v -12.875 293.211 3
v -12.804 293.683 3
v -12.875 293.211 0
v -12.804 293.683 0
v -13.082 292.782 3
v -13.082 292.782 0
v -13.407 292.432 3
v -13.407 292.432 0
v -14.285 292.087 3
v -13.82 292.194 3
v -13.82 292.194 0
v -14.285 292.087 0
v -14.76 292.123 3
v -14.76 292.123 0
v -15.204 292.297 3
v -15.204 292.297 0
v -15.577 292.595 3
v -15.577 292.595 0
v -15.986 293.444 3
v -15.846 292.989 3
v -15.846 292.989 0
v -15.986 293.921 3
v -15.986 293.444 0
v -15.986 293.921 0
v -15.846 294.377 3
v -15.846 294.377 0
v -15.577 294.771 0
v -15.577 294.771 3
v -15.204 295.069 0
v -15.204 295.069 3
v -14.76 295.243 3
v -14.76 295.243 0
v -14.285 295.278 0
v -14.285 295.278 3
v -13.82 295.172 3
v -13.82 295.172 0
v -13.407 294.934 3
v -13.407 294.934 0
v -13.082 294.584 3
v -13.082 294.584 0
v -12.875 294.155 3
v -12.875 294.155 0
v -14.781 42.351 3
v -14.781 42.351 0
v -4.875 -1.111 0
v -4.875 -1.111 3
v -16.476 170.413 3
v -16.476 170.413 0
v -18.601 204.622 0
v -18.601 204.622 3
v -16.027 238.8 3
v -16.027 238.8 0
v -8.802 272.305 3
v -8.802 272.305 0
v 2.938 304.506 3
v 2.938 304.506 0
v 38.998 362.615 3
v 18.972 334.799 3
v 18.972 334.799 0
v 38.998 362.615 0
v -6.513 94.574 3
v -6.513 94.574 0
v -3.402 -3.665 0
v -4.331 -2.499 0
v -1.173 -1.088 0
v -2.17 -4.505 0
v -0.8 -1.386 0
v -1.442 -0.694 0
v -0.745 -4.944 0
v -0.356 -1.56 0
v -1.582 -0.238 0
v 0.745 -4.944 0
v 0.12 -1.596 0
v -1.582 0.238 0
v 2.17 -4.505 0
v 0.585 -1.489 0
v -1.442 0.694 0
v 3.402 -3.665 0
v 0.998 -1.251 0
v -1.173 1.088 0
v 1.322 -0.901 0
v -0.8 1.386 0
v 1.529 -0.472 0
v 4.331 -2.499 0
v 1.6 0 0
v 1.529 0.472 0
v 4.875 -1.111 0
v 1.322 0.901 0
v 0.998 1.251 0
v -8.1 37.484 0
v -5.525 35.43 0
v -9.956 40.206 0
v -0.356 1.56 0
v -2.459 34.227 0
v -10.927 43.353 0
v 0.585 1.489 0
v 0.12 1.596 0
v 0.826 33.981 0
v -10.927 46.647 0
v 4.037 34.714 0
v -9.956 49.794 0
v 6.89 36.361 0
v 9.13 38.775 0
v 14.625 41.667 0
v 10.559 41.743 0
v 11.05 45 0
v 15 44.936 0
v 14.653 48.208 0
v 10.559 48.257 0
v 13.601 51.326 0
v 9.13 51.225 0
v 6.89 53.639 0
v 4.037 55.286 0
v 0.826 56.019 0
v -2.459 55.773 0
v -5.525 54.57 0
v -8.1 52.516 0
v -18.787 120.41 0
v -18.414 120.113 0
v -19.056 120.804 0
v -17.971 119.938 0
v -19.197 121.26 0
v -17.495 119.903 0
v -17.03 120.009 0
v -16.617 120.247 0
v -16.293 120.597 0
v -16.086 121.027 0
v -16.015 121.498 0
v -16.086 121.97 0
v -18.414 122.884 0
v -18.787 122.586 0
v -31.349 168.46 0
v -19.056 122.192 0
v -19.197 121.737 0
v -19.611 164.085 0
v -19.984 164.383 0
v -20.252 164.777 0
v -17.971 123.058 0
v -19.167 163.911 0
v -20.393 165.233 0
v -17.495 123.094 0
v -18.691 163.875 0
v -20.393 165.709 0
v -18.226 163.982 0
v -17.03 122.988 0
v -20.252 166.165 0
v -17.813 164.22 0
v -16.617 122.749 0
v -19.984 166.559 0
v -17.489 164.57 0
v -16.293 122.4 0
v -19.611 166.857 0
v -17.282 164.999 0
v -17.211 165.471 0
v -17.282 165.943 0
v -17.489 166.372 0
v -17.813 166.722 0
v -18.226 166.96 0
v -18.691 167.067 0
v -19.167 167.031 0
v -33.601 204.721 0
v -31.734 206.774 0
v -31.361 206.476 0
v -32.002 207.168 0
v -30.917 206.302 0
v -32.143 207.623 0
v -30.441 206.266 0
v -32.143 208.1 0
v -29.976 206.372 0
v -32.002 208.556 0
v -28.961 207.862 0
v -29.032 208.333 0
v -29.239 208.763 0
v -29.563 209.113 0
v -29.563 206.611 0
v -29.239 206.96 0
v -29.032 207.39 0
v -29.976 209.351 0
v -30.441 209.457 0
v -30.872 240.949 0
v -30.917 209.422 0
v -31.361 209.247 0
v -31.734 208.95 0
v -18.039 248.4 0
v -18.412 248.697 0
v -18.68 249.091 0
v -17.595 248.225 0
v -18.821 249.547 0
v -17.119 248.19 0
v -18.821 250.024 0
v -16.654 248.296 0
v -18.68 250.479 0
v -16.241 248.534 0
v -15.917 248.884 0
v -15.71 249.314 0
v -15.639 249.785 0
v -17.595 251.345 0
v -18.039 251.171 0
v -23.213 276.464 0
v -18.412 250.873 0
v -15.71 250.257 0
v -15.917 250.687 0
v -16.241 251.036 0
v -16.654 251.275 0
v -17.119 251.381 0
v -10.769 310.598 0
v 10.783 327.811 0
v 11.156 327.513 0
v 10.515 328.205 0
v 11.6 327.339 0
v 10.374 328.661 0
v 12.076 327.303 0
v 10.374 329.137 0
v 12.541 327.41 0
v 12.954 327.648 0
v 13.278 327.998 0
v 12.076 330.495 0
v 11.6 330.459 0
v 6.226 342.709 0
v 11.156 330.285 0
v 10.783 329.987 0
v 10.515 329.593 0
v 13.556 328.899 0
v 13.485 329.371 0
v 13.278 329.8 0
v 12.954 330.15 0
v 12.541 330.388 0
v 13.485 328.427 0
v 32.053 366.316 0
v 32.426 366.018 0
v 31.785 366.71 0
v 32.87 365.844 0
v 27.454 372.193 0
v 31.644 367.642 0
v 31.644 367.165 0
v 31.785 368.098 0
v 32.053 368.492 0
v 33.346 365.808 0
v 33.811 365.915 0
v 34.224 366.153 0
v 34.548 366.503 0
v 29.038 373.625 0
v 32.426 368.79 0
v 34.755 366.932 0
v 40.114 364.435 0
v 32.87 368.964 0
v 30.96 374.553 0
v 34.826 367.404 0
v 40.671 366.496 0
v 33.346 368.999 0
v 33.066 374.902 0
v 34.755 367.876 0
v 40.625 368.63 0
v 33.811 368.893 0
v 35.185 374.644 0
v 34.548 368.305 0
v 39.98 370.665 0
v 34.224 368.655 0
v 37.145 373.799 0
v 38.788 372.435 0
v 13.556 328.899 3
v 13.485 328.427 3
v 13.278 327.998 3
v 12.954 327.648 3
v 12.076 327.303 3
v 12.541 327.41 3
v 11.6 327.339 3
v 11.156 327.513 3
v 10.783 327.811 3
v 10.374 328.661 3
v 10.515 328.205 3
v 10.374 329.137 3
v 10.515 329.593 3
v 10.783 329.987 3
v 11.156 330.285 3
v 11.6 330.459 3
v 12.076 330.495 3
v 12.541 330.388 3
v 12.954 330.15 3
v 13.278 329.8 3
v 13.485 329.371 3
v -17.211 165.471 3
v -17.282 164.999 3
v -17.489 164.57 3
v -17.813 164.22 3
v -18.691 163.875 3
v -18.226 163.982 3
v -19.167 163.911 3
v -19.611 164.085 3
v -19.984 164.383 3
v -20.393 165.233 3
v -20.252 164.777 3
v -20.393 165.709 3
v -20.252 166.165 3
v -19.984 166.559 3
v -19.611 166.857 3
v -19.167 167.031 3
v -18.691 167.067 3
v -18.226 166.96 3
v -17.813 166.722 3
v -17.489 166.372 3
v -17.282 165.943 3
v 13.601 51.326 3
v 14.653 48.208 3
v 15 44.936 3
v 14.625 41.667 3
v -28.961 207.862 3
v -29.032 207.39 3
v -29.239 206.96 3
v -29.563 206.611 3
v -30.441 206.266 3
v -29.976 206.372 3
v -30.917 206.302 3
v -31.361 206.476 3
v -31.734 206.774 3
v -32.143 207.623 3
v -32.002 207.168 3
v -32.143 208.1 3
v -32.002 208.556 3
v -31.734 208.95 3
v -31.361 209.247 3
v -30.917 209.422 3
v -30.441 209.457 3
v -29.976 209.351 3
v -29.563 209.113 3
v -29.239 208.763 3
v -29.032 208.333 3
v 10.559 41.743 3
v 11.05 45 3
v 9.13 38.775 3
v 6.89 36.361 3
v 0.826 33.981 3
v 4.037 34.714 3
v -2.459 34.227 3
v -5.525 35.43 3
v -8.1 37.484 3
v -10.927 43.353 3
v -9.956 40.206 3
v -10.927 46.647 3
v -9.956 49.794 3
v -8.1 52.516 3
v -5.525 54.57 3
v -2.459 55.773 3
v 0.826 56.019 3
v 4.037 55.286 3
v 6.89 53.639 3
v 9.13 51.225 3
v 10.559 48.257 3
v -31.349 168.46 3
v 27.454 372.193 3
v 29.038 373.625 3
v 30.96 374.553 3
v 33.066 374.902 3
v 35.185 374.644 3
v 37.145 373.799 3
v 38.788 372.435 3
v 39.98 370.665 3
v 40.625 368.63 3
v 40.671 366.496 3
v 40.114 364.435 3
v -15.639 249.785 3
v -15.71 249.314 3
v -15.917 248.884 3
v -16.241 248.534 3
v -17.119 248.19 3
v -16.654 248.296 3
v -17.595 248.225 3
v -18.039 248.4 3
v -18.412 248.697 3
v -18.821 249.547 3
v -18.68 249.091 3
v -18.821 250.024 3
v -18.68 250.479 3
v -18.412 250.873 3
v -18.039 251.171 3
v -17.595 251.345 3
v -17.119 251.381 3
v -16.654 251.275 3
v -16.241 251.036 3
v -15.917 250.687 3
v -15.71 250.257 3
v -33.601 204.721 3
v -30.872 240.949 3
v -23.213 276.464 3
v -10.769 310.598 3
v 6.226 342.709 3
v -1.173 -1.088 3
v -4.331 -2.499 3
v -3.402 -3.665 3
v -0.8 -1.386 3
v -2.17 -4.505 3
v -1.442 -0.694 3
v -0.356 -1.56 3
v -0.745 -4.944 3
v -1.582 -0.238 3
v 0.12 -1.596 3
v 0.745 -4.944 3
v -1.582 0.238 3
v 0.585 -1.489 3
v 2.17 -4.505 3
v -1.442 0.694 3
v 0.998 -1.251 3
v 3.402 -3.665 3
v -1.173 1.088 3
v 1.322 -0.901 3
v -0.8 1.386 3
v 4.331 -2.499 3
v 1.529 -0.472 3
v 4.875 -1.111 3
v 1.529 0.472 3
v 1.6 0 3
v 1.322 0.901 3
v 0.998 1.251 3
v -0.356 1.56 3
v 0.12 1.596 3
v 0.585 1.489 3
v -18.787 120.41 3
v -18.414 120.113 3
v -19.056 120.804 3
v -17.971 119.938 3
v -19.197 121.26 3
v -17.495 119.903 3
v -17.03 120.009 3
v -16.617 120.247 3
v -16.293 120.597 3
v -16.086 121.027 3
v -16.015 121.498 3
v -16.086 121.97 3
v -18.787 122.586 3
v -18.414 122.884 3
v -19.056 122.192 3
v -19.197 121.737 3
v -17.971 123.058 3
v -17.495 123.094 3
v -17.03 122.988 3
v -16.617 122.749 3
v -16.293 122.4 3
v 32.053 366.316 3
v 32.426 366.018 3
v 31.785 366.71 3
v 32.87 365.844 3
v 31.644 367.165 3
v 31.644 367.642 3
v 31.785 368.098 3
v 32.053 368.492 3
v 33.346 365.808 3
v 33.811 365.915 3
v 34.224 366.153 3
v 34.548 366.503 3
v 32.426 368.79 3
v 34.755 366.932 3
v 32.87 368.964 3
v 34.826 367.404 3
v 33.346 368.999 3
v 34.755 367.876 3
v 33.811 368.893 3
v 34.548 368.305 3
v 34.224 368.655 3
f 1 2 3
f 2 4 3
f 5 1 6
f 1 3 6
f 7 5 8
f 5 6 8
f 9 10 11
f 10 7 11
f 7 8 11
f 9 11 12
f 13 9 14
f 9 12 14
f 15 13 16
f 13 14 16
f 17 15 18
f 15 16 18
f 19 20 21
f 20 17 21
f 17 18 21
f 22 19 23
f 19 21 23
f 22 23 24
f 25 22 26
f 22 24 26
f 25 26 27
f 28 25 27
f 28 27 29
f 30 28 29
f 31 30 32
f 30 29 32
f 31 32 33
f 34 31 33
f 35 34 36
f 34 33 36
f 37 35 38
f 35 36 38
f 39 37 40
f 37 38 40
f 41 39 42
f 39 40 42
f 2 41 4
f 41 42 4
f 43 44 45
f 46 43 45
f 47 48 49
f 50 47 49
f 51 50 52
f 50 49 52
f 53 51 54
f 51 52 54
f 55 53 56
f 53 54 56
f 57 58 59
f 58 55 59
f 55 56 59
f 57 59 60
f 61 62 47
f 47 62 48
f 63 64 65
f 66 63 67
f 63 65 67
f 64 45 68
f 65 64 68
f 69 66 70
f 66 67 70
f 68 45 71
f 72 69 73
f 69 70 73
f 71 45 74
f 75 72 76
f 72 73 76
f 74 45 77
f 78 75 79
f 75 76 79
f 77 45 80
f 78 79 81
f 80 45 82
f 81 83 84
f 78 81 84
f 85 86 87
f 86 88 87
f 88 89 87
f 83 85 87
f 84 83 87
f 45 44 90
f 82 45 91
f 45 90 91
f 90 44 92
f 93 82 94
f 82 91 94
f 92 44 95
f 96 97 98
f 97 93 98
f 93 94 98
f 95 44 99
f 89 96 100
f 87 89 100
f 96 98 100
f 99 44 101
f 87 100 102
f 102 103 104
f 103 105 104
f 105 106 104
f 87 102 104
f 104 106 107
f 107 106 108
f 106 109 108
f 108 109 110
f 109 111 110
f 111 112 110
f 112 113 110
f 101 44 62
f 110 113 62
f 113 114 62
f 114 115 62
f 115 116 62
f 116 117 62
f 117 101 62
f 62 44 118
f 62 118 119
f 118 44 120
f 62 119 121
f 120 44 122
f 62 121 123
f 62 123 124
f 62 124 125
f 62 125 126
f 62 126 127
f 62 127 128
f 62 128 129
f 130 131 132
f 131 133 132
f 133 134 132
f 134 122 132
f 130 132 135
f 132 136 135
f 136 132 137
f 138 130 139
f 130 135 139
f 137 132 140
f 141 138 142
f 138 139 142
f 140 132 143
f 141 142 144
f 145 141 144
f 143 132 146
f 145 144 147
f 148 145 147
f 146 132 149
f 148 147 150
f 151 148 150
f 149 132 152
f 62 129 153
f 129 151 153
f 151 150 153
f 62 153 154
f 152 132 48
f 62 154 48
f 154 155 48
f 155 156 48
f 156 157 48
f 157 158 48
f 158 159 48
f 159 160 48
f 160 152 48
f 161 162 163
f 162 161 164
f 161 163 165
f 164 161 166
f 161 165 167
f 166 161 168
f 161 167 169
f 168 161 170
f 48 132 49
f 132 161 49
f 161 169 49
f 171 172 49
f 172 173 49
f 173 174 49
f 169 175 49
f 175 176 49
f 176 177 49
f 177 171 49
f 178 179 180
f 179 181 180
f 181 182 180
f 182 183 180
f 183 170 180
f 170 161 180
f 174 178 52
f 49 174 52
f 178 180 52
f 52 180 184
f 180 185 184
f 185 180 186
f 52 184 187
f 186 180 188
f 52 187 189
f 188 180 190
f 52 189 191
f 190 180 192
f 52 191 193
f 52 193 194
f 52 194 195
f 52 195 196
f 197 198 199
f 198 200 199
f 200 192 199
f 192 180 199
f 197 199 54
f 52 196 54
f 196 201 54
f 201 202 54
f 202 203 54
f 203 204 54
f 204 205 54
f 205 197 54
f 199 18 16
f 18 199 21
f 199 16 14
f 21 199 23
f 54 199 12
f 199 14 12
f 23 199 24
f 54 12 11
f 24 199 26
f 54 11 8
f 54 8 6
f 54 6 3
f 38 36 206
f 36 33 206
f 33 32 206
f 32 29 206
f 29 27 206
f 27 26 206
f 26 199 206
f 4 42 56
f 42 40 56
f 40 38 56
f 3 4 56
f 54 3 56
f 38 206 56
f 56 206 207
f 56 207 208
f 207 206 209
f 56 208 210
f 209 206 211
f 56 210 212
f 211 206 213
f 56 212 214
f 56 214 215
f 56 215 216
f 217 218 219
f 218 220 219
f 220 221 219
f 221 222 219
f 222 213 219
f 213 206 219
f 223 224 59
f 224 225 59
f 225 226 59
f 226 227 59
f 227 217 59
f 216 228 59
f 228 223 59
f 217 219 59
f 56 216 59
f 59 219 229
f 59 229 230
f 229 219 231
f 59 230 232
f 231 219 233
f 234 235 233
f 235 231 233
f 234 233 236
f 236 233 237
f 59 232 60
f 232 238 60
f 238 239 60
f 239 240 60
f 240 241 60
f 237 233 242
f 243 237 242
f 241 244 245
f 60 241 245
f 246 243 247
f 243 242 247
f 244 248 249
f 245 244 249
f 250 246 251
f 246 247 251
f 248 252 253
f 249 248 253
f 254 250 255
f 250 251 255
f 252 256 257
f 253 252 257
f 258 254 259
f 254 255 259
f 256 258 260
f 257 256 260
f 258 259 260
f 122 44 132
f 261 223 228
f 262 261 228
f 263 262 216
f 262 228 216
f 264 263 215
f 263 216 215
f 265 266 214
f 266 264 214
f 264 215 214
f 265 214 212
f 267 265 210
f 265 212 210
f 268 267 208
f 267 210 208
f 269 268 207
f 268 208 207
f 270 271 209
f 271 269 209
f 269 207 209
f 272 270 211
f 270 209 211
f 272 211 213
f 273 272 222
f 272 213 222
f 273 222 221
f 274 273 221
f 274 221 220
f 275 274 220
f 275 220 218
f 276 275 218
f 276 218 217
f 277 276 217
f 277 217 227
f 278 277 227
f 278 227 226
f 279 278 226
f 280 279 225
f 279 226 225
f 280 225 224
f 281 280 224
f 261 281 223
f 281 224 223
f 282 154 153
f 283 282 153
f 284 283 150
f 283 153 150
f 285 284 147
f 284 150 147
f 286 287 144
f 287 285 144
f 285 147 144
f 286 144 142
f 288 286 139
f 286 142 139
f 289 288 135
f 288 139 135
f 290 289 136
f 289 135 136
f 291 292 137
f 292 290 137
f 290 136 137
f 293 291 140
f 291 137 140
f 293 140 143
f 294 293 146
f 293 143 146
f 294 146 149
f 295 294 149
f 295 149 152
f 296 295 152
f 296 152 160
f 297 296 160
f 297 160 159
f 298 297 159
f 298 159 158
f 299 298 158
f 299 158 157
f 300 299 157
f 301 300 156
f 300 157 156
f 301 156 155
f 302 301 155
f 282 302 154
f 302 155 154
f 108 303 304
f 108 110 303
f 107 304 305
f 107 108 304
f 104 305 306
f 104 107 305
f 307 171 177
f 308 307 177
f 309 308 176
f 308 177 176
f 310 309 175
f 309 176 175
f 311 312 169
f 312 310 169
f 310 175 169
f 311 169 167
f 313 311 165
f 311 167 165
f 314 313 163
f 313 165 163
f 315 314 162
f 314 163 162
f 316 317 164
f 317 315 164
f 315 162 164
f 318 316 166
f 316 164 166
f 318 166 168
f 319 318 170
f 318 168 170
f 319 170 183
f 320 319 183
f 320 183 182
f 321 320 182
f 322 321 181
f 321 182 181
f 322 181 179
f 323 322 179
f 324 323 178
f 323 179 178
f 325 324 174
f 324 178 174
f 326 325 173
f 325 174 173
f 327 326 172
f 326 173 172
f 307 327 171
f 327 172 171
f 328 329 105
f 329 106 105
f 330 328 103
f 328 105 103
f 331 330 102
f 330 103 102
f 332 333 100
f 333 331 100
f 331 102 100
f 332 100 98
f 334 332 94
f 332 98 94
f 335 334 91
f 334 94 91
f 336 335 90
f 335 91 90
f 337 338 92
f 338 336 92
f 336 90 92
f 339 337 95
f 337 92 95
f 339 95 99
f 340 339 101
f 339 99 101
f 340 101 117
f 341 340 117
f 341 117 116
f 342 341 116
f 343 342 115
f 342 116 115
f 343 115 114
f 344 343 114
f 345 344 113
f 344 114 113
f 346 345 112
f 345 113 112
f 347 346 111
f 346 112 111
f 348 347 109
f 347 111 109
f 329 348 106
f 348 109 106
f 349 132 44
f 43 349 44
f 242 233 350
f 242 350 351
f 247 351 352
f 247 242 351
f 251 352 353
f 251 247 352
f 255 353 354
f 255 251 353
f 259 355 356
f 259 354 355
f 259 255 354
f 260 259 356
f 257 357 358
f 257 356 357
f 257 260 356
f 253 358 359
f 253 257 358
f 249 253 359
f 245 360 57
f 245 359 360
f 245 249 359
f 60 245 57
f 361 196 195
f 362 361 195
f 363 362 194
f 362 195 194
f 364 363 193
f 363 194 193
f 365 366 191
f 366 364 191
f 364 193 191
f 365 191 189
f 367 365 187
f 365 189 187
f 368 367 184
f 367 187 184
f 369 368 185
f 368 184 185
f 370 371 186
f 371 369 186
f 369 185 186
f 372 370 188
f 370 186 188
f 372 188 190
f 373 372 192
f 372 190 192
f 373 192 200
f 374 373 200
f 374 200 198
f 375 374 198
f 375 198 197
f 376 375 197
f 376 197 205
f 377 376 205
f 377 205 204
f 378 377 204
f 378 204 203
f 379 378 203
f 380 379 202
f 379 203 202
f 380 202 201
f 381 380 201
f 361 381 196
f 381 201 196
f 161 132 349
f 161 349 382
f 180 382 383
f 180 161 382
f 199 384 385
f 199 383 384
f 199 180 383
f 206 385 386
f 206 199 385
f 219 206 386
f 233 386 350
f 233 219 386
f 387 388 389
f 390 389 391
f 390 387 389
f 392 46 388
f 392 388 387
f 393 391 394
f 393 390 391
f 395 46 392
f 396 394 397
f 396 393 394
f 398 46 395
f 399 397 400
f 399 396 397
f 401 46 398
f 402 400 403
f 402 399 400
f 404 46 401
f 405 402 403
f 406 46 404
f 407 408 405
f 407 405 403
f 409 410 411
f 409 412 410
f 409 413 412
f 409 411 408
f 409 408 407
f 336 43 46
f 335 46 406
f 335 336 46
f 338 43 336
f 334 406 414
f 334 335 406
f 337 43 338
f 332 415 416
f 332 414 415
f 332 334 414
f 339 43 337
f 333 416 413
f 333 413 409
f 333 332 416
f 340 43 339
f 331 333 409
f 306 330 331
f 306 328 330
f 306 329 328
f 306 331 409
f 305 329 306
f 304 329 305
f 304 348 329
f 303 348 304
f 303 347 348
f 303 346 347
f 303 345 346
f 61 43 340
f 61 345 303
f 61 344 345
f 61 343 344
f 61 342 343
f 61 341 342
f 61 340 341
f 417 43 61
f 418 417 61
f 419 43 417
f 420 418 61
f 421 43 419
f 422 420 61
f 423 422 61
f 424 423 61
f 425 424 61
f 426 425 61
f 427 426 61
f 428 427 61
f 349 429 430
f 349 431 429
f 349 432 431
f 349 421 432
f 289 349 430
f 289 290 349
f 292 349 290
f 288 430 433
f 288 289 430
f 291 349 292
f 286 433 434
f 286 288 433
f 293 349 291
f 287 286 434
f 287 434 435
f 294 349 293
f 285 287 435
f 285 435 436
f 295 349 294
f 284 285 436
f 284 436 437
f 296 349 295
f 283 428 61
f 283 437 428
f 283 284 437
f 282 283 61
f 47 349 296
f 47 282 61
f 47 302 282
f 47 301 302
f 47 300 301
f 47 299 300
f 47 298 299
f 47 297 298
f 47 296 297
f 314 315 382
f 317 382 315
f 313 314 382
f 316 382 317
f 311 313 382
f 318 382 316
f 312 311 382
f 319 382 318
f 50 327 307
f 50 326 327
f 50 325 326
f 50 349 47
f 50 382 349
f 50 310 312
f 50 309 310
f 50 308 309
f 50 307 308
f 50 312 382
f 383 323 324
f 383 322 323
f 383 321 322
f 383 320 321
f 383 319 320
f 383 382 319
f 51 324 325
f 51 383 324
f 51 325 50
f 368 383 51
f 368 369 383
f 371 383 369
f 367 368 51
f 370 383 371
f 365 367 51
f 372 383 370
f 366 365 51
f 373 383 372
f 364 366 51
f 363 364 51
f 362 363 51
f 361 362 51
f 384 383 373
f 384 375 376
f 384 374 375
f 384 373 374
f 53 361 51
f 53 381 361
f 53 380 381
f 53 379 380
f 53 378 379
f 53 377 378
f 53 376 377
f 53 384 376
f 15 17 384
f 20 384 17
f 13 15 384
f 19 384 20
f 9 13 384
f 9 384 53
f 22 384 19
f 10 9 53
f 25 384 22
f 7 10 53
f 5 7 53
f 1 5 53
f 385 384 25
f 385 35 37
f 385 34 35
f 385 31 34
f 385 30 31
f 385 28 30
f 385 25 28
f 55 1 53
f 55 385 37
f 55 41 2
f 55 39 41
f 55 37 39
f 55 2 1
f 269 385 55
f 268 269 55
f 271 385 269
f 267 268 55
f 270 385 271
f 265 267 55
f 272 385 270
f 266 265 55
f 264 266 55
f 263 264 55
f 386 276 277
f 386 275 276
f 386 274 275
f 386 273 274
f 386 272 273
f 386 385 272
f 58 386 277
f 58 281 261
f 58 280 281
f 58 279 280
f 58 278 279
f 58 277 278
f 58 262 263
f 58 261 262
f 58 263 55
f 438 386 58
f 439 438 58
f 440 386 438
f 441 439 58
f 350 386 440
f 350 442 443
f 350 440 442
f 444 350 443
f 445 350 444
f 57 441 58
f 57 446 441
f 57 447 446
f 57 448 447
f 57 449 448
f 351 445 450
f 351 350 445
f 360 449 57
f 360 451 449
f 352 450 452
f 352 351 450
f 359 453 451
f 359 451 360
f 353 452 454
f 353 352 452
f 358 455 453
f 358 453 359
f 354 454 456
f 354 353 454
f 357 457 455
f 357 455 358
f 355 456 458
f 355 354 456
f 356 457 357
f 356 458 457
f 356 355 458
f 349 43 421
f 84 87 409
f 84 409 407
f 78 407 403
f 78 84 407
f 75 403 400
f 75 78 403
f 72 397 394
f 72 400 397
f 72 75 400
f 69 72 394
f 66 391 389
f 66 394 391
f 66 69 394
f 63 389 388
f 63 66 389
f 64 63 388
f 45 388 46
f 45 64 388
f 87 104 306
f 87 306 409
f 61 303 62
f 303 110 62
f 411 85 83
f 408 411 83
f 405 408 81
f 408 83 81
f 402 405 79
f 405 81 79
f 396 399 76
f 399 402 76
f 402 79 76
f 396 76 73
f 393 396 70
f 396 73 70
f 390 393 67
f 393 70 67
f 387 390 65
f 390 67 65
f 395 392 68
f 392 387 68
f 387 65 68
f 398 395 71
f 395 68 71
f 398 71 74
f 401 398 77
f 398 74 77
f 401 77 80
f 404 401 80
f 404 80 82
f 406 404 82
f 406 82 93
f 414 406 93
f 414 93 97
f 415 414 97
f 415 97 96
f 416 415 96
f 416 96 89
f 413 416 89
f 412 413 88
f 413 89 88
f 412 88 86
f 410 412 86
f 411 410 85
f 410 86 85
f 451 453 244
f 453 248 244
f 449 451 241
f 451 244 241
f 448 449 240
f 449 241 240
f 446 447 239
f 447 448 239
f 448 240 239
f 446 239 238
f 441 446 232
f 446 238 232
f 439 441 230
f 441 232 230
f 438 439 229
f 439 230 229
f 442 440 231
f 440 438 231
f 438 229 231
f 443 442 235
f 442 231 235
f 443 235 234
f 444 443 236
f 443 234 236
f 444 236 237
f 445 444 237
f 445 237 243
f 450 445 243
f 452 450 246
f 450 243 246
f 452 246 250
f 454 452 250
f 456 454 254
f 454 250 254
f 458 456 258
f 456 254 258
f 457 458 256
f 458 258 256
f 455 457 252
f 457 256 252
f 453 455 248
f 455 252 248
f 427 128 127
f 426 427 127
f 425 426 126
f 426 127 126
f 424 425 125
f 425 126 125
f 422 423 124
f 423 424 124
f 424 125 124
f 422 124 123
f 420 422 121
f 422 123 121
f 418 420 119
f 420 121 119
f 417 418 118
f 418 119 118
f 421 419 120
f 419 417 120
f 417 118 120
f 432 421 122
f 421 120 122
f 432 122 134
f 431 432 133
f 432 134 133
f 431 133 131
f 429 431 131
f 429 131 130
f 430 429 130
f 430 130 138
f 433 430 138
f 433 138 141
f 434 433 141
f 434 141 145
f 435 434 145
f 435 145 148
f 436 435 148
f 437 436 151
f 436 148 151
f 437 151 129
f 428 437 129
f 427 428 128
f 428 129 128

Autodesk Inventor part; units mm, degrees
ref_plane "YZ Plane" through (0, 0, 0) normal (1, 0, 0) x (0, 1, 0)
ref_plane "XZ Plane" through (0, 0, 0) normal (0, 1, 0) x (-1, 0, 0)
ref_plane "XY Plane" through (0, 0, 0) normal (0, 0, 1) x (1, 0, 0)
sketch "スケッチ1" plane through (0, 0, 0) normal (0, 0, 1) x (1, 0, 0)
  circle A0 centre (0, 0) radius 1.6
  circle A1 centre (0, 45) radius 11.05
  line L0 (0, 0) -> (0, 45) construction
  line L1 (0, 45) -> (38.9982, 362.6148) construction
  arc A2 (38.9982, 362.6148) -> (-16.4764, 170.4134) centre (231.3937, 202.9777) ccw
  line L2 (0, 45) -> (-6.5129, 94.574) construction
  arc A3 (-16.4764, 170.4134) -> (6.0935, 94.6273) centre (231.3937, 202.9777) ccw construction
  arc A4 (-14.6969, 42) -> (14.6249, 41.6667) centre (0, 45) ccw construction
  arc A5 (4.875, -1.1111) -> (-4.875, -1.1111) centre (0, 0) ccw construction
  line L3 (-14.7808, 42.3506) -> (-4.875, -1.1111)
  line L4 (14.6249, 41.6667) -> (4.875, -1.1111)
  line L5 (13.601, 51.3255) -> (-6.5129, 94.574)
  line L6 (-6.5129, 94.574) -> (-16.4764, 170.4134)
  arc A6 (38.9982, 362.6148) -> (27.4545, 372.193) centre (33.2263, 367.4039) ccw
  arc A7 (27.4545, 372.193) -> (-31.3486, 168.4596) centre (231.3937, 202.9777) ccw
  line L7 (-31.3486, 168.4596) -> (-14.7808, 42.3506)
  arc A8 (13.601, 51.3255) -> (-14.2261, 40.2443) centre (0, 45) ccw construction
  arc A9 (14.6249, 41.6667) -> (13.601, 51.3255) centre (0, 45) ccw
  arc A10 (-4.875, -1.1111) -> (4.875, -1.1111) centre (0, 0) ccw
  circle A11 centre (33.2263, 367.4039) radius 1.6
  arc A12 (41.0983, 369.7011) -> (-20.1506, 175.8768) centre (231.3937, 202.9777) ccw construction
  arc A13 (32.7138, 373.7709) -> (-17.6145, 121.4982) centre (231.3937, 202.9777) ccw construction
  circle A14 centre (11.9561, 328.899) radius 1.6
  circle A15 centre (-14.4042, 293.6829) radius 1.6
  circle A16 centre (-17.2387, 249.7852) radius 1.6
  circle A17 centre (-30.5608, 207.8618) radius 1.6
  circle A18 centre (-18.8107, 165.471) radius 1.6
  circle A19 centre (11.9561, 328.899) radius 3 construction
  circle A20 centre (-14.4042, 293.6829) radius 3 construction
  circle A21 centre (-17.6145, 121.4982) radius 1.6
  line L8 (-25.0506, 120.5212) -> (-17.6145, 121.4982) construction
  line L9 (-17.6145, 121.4982) -> (-10.1784, 122.4751) construction
  line L10 (33.2263, 367.4039) -> (11.9561, 328.899) construction
  line L11 (11.9561, 328.899) -> (-14.4042, 293.6829) construction
  line L12 (-14.4042, 293.6829) -> (-17.2387, 249.7852) construction
  line L13 (-17.2387, 249.7852) -> (-30.5608, 207.8618) construction
  line L14 (-30.5608, 207.8618) -> (-18.8107, 165.471) construction
  line L15 (-18.8107, 165.471) -> (-17.6145, 121.4982) construction
  dimension "d0" = 3.2
  dimension "d1" = 22.1
  dimension "d2" = 45
  dimension "d3" = 173
  dimension "d4" = 250
  dimension "d6" = 50
  dimension "d7" = 320
  dimension "d8" = 30
  dimension "d9" = 10
  dimension "d10" = 50
  dimension "d11" = 7.5
  dimension "d12" = 3.2
  dimension "d13" = 3.2
  dimension "d14" = 3.2
  dimension "d15" = 3.2
  dimension "d16" = 3.2
  dimension "d17" = 3.2
  dimension "d18" = 6
  dimension "d19" = 6
  dimension "d20" = 3.2
extrude "押し出し1" add sketch "スケッチ1" along normal blind 3
properties part number "ハンド" material "アセタール樹脂、黒"
